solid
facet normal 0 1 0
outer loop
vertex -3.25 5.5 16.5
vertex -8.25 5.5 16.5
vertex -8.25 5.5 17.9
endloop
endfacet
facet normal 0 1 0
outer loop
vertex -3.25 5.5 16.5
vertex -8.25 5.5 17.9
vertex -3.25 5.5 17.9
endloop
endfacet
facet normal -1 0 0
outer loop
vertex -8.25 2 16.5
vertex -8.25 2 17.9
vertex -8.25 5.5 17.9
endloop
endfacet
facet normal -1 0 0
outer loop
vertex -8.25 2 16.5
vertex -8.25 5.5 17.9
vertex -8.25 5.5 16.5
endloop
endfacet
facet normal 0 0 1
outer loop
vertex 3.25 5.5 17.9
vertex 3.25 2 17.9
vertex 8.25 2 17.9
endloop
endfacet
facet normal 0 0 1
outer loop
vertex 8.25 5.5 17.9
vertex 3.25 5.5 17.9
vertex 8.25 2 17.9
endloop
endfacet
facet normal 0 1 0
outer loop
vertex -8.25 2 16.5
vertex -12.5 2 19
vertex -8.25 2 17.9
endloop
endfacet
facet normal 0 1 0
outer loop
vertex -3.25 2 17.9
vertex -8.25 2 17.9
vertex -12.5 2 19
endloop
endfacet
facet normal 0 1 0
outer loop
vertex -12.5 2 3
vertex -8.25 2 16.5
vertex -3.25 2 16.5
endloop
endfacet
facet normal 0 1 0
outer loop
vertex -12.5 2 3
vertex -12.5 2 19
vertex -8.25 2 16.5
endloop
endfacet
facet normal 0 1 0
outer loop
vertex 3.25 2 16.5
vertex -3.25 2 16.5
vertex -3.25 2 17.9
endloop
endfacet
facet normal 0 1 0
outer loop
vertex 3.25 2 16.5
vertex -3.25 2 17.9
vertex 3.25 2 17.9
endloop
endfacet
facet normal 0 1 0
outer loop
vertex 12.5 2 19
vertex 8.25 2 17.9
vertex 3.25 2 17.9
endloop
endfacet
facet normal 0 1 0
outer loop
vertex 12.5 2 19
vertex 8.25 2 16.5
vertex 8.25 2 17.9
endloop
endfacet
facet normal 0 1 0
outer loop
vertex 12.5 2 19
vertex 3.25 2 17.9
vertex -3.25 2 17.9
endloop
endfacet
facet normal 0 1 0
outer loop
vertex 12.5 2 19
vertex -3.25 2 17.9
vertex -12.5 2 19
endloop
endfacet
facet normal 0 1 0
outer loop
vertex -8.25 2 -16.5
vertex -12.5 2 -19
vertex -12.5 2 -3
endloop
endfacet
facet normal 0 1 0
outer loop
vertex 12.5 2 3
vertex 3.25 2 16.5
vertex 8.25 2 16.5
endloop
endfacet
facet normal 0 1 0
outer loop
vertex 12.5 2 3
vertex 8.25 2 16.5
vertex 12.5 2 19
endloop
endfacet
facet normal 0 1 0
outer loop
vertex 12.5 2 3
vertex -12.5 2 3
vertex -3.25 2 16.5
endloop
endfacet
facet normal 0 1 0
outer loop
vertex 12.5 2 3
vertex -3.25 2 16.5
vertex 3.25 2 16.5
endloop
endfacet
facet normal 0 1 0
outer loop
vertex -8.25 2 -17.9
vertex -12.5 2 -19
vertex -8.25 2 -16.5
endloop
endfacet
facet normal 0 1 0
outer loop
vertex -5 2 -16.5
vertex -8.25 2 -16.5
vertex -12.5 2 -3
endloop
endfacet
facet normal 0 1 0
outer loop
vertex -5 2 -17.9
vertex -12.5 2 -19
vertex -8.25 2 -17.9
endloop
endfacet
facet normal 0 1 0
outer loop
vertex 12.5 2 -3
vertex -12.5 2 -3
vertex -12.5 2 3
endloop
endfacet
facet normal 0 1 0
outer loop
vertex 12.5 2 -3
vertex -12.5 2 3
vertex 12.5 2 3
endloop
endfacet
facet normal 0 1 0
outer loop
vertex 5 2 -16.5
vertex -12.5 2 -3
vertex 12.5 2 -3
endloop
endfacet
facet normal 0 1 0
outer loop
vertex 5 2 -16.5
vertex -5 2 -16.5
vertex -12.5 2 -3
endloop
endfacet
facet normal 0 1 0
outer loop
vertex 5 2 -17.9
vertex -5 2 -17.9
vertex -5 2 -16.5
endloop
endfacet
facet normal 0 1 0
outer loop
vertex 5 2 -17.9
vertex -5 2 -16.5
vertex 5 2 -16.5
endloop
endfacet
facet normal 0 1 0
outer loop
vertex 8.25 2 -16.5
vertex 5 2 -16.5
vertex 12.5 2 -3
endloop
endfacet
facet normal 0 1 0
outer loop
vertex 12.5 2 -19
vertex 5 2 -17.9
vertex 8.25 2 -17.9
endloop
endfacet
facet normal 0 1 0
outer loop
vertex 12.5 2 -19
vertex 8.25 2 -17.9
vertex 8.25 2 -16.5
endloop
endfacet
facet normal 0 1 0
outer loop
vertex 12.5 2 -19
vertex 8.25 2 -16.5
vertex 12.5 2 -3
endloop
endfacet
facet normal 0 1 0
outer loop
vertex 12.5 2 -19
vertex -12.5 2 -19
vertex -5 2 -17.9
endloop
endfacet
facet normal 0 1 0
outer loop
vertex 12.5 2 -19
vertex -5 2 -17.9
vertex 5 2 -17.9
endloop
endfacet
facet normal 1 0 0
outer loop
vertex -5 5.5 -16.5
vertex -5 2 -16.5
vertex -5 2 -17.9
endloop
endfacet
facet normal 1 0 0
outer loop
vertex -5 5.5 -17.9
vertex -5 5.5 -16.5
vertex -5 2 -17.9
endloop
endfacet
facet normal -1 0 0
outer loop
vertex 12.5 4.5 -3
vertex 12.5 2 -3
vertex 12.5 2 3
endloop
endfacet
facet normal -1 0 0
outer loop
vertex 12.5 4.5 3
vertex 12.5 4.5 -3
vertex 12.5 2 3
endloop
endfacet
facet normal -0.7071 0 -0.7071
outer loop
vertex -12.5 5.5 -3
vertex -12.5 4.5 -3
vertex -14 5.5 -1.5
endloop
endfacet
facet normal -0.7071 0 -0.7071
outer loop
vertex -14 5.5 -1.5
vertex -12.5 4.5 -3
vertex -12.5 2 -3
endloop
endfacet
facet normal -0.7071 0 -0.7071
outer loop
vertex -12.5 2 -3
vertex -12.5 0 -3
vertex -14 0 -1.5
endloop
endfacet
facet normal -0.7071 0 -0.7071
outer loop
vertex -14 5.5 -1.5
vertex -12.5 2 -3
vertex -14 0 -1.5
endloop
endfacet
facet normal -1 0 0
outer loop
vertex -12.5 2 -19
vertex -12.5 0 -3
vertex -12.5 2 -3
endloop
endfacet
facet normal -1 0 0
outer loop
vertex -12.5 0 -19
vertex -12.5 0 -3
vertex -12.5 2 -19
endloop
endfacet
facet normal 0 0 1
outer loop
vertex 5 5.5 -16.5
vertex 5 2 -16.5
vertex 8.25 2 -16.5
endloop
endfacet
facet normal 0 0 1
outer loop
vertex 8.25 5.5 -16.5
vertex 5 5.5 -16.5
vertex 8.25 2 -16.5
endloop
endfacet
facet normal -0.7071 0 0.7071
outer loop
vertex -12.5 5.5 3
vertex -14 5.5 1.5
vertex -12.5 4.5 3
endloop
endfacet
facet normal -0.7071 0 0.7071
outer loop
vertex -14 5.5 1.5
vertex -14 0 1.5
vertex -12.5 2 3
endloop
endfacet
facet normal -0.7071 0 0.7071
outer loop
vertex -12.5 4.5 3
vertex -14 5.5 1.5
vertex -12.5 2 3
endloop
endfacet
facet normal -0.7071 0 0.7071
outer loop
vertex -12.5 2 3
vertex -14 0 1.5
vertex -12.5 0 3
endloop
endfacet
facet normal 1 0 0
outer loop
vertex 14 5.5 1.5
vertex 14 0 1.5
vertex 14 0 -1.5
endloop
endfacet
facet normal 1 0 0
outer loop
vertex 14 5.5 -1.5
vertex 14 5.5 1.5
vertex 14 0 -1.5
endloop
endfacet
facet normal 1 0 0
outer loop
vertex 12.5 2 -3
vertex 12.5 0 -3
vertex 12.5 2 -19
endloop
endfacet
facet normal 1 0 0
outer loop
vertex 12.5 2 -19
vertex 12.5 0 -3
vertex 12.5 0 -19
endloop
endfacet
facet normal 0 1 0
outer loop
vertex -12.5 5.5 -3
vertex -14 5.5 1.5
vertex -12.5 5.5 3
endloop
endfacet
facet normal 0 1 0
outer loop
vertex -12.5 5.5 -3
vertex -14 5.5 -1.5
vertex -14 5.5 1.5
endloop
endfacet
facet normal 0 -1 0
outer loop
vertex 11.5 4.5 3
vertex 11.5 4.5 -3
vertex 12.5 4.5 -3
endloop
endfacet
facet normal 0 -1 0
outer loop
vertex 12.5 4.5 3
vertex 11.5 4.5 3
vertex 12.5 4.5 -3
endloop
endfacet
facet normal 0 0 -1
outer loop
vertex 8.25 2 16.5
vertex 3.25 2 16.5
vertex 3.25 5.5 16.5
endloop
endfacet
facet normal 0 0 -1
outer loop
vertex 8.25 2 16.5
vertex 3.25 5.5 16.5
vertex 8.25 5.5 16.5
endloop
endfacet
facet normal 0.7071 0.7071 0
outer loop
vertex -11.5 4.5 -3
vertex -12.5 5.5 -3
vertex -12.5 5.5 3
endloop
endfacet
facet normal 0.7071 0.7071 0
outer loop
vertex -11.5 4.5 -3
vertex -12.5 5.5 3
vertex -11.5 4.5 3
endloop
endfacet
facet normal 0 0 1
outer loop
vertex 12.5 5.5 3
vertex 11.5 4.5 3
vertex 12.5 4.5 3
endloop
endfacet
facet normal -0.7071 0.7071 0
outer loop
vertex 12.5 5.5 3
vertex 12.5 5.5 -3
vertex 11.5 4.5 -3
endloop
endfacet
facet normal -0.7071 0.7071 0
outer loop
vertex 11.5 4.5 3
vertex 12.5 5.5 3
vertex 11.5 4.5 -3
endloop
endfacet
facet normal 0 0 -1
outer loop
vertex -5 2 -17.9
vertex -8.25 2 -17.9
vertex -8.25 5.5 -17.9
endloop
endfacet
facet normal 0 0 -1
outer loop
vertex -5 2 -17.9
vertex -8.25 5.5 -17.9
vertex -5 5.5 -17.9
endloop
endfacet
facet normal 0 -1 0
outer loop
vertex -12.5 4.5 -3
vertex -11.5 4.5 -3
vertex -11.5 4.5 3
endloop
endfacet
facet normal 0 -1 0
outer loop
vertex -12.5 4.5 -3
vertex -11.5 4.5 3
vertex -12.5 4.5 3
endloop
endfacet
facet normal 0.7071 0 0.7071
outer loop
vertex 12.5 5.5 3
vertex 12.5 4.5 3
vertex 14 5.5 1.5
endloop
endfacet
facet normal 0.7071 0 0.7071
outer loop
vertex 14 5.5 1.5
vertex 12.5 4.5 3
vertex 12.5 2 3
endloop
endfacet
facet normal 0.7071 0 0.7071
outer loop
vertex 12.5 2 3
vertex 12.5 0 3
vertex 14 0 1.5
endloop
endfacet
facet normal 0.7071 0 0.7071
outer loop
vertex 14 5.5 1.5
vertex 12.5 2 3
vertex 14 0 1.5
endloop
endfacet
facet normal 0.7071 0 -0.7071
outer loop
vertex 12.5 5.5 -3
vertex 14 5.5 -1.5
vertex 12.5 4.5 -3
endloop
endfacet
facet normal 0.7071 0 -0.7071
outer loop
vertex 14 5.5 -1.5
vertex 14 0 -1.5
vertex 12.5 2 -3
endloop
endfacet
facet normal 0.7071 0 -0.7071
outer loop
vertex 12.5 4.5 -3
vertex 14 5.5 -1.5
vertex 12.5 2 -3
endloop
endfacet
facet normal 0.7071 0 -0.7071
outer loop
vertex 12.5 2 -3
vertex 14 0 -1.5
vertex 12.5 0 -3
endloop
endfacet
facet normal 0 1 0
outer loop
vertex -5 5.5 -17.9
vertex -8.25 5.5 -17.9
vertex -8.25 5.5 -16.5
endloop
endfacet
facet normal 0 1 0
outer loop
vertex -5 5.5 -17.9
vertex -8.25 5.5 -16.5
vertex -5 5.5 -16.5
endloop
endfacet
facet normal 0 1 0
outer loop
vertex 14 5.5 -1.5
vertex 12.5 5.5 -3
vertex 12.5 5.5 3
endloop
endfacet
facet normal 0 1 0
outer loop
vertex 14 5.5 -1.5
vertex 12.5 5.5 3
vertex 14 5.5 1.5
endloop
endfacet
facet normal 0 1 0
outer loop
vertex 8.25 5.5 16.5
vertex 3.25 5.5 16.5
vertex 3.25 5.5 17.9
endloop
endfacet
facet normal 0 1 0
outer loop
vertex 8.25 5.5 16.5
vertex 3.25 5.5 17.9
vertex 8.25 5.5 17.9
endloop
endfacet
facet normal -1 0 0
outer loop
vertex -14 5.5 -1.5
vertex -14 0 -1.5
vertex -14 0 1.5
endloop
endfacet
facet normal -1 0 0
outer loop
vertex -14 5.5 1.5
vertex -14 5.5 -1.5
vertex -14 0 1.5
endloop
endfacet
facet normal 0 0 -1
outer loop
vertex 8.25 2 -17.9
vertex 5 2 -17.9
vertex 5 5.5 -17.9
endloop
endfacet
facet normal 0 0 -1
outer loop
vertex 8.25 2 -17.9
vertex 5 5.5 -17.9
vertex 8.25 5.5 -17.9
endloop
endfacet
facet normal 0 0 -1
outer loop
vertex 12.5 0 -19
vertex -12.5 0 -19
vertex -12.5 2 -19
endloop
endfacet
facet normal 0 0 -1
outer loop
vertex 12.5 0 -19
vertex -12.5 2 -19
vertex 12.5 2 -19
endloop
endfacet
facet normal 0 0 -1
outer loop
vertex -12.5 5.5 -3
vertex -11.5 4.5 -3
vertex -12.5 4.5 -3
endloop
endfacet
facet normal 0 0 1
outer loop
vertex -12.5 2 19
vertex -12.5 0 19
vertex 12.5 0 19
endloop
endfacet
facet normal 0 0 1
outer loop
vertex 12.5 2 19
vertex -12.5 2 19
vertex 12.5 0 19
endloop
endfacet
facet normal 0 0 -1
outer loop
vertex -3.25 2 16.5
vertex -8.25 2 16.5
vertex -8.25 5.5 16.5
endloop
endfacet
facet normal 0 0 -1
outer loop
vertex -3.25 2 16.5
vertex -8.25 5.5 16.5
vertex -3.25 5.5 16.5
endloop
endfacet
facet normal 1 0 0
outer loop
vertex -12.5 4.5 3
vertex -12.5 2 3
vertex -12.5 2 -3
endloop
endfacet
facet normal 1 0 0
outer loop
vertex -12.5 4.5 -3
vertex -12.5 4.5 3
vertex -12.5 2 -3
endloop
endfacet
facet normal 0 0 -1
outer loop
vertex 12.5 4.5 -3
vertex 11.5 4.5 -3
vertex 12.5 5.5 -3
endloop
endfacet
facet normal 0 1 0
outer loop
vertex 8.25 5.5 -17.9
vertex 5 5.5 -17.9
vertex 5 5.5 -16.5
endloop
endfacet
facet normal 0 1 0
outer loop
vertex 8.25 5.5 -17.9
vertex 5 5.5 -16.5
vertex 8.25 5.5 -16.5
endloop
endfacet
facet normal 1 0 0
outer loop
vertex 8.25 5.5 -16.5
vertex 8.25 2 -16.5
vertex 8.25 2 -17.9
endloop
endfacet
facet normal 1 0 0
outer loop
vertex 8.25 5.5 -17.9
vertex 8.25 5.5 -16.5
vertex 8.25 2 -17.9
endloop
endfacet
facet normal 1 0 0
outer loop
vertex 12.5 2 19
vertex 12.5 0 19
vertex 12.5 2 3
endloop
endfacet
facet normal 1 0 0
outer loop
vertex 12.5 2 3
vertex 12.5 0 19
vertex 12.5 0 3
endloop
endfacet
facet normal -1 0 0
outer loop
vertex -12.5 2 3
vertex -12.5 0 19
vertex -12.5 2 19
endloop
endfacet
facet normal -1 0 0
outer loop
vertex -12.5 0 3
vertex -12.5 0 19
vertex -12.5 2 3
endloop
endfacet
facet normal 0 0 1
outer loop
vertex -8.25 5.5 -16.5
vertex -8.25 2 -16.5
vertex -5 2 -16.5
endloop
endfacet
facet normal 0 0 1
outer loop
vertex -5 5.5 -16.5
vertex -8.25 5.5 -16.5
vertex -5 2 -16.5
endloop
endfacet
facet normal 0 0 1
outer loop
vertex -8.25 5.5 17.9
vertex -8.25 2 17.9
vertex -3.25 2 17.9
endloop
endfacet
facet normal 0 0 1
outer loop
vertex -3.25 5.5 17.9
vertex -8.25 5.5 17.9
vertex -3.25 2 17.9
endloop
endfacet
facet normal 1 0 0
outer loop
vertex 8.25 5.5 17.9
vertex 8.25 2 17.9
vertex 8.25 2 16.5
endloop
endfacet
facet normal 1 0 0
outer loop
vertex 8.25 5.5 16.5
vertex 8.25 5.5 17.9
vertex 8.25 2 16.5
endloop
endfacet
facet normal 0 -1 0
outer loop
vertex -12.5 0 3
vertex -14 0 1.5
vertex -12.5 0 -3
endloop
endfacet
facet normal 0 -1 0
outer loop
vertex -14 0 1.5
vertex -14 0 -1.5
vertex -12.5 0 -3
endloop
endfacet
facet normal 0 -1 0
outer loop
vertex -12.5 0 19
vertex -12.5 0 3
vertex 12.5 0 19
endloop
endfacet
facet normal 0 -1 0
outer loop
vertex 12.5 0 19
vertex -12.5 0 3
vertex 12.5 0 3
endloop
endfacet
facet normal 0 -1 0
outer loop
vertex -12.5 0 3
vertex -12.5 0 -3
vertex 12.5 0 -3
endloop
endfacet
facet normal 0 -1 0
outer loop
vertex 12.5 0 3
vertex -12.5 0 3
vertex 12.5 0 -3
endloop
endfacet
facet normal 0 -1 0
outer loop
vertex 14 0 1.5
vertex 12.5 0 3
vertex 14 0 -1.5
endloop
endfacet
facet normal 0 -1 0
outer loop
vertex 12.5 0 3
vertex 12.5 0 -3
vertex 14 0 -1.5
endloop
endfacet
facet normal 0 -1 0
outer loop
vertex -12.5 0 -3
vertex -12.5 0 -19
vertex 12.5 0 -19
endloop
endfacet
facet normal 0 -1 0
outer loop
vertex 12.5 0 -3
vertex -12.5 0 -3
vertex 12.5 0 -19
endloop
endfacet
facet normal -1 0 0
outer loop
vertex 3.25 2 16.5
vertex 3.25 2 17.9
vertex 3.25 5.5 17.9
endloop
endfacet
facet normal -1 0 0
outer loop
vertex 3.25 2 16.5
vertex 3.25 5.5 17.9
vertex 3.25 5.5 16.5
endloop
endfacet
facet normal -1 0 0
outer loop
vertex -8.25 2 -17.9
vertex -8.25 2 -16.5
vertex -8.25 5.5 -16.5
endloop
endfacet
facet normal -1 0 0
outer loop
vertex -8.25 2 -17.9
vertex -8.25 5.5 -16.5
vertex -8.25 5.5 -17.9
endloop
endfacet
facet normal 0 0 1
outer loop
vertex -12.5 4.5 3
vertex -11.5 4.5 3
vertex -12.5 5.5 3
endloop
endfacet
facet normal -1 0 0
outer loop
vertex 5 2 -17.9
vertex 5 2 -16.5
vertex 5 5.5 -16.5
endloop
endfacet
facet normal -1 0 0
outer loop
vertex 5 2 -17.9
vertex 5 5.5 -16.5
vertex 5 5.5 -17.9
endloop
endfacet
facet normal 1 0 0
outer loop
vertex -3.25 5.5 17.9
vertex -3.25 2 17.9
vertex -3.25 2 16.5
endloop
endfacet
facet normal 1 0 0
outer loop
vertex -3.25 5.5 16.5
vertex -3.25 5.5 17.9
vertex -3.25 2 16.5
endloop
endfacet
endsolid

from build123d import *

# Parameters (mm, degrees)
SKETCH1_W                = 25
SKETCH1_H                = 38
SKETCH1_W_2              = 16.5
SKETCH1_H_2              = 1.4
BOSS_EXTRUDE1_DEPTH      = 2
SKETCH1_3_W              = 16.5
SKETCH1_3_H              = 1.4
BOSS_EXTRUDE2_DEPTH      = 5.5
BOSS_EXTRUDE3_DEPTH      = 3
BOSS_EXTRUDE3_DEPTH_BACK = 3
SKETCH3_W                = 6.5
SKETCH3_H                = 1.4
SKETCH3_W_2              = 10
CUT_EXTRUDE1_DEPTH       = 3.5


with BuildPart() as part:
    # Sketch1 → Boss-Extrude1 (new body)
    with BuildSketch(Plane(origin=(0, 0, 0), x_dir=(1, 0, 0), z_dir=(0, 1, 0))):
        Rectangle(SKETCH1_W, SKETCH1_H)
        with Locations((0, -17.2)):
            Rectangle(SKETCH1_W_2, SKETCH1_H_2, mode=Mode.SUBTRACT)
        with Locations((0, 17.2)):
            Rectangle(SKETCH1_W_2, SKETCH1_H_2, mode=Mode.SUBTRACT)
    extrude(amount=BOSS_EXTRUDE1_DEPTH)

    # Sketch1<3> → Boss-Extrude2 (add)
    with BuildSketch(Plane(origin=(0, 0, 0), x_dir=(1, 0, 0), z_dir=(0, 1, 0))):
        Polygon((-14, -1.5), (-12.5, -3), (-12.5, 3), (-14, 1.5), align=None)
        Polygon((12.5, 3), (12.5, -3), (14, -1.5), (14, 1.5), align=None)
        with Locations((0, 17.2)):
            Rectangle(SKETCH1_3_W, SKETCH1_3_H)
        with Locations((0, -17.2)):
            Rectangle(SKETCH1_3_W, SKETCH1_3_H)
    extrude(amount=BOSS_EXTRUDE2_DEPTH)

    # Sketch2 → Boss-Extrude3 (add, two sides: drawn at the far end of the back side and taken through both)
    with BuildSketch(Plane.XY.offset(-BOSS_EXTRUDE3_DEPTH_BACK)):
        Polygon((12.5, 5.5), (11.5, 4.5), (12.5, 4.5), align=None)
        Polygon((-11.5, 4.5), (-12.5, 4.5), (-12.5, 5.5), align=None)
    extrude(amount=BOSS_EXTRUDE3_DEPTH + BOSS_EXTRUDE3_DEPTH_BACK)

    # Sketch3 → Cut-Extrude1 (cut)
    with BuildSketch(Plane(origin=(0, 2, 0), x_dir=(1, 0, 0), z_dir=(0, 1, 0))):
        with Locations((0, -17.2)):
            Rectangle(SKETCH3_W, SKETCH3_H)
        with Locations((0, 17.2)):
            Rectangle(SKETCH3_W_2, SKETCH3_H)
    extrude(amount=CUT_EXTRUDE1_DEPTH, mode=Mode.SUBTRACT)


solid = part.part
